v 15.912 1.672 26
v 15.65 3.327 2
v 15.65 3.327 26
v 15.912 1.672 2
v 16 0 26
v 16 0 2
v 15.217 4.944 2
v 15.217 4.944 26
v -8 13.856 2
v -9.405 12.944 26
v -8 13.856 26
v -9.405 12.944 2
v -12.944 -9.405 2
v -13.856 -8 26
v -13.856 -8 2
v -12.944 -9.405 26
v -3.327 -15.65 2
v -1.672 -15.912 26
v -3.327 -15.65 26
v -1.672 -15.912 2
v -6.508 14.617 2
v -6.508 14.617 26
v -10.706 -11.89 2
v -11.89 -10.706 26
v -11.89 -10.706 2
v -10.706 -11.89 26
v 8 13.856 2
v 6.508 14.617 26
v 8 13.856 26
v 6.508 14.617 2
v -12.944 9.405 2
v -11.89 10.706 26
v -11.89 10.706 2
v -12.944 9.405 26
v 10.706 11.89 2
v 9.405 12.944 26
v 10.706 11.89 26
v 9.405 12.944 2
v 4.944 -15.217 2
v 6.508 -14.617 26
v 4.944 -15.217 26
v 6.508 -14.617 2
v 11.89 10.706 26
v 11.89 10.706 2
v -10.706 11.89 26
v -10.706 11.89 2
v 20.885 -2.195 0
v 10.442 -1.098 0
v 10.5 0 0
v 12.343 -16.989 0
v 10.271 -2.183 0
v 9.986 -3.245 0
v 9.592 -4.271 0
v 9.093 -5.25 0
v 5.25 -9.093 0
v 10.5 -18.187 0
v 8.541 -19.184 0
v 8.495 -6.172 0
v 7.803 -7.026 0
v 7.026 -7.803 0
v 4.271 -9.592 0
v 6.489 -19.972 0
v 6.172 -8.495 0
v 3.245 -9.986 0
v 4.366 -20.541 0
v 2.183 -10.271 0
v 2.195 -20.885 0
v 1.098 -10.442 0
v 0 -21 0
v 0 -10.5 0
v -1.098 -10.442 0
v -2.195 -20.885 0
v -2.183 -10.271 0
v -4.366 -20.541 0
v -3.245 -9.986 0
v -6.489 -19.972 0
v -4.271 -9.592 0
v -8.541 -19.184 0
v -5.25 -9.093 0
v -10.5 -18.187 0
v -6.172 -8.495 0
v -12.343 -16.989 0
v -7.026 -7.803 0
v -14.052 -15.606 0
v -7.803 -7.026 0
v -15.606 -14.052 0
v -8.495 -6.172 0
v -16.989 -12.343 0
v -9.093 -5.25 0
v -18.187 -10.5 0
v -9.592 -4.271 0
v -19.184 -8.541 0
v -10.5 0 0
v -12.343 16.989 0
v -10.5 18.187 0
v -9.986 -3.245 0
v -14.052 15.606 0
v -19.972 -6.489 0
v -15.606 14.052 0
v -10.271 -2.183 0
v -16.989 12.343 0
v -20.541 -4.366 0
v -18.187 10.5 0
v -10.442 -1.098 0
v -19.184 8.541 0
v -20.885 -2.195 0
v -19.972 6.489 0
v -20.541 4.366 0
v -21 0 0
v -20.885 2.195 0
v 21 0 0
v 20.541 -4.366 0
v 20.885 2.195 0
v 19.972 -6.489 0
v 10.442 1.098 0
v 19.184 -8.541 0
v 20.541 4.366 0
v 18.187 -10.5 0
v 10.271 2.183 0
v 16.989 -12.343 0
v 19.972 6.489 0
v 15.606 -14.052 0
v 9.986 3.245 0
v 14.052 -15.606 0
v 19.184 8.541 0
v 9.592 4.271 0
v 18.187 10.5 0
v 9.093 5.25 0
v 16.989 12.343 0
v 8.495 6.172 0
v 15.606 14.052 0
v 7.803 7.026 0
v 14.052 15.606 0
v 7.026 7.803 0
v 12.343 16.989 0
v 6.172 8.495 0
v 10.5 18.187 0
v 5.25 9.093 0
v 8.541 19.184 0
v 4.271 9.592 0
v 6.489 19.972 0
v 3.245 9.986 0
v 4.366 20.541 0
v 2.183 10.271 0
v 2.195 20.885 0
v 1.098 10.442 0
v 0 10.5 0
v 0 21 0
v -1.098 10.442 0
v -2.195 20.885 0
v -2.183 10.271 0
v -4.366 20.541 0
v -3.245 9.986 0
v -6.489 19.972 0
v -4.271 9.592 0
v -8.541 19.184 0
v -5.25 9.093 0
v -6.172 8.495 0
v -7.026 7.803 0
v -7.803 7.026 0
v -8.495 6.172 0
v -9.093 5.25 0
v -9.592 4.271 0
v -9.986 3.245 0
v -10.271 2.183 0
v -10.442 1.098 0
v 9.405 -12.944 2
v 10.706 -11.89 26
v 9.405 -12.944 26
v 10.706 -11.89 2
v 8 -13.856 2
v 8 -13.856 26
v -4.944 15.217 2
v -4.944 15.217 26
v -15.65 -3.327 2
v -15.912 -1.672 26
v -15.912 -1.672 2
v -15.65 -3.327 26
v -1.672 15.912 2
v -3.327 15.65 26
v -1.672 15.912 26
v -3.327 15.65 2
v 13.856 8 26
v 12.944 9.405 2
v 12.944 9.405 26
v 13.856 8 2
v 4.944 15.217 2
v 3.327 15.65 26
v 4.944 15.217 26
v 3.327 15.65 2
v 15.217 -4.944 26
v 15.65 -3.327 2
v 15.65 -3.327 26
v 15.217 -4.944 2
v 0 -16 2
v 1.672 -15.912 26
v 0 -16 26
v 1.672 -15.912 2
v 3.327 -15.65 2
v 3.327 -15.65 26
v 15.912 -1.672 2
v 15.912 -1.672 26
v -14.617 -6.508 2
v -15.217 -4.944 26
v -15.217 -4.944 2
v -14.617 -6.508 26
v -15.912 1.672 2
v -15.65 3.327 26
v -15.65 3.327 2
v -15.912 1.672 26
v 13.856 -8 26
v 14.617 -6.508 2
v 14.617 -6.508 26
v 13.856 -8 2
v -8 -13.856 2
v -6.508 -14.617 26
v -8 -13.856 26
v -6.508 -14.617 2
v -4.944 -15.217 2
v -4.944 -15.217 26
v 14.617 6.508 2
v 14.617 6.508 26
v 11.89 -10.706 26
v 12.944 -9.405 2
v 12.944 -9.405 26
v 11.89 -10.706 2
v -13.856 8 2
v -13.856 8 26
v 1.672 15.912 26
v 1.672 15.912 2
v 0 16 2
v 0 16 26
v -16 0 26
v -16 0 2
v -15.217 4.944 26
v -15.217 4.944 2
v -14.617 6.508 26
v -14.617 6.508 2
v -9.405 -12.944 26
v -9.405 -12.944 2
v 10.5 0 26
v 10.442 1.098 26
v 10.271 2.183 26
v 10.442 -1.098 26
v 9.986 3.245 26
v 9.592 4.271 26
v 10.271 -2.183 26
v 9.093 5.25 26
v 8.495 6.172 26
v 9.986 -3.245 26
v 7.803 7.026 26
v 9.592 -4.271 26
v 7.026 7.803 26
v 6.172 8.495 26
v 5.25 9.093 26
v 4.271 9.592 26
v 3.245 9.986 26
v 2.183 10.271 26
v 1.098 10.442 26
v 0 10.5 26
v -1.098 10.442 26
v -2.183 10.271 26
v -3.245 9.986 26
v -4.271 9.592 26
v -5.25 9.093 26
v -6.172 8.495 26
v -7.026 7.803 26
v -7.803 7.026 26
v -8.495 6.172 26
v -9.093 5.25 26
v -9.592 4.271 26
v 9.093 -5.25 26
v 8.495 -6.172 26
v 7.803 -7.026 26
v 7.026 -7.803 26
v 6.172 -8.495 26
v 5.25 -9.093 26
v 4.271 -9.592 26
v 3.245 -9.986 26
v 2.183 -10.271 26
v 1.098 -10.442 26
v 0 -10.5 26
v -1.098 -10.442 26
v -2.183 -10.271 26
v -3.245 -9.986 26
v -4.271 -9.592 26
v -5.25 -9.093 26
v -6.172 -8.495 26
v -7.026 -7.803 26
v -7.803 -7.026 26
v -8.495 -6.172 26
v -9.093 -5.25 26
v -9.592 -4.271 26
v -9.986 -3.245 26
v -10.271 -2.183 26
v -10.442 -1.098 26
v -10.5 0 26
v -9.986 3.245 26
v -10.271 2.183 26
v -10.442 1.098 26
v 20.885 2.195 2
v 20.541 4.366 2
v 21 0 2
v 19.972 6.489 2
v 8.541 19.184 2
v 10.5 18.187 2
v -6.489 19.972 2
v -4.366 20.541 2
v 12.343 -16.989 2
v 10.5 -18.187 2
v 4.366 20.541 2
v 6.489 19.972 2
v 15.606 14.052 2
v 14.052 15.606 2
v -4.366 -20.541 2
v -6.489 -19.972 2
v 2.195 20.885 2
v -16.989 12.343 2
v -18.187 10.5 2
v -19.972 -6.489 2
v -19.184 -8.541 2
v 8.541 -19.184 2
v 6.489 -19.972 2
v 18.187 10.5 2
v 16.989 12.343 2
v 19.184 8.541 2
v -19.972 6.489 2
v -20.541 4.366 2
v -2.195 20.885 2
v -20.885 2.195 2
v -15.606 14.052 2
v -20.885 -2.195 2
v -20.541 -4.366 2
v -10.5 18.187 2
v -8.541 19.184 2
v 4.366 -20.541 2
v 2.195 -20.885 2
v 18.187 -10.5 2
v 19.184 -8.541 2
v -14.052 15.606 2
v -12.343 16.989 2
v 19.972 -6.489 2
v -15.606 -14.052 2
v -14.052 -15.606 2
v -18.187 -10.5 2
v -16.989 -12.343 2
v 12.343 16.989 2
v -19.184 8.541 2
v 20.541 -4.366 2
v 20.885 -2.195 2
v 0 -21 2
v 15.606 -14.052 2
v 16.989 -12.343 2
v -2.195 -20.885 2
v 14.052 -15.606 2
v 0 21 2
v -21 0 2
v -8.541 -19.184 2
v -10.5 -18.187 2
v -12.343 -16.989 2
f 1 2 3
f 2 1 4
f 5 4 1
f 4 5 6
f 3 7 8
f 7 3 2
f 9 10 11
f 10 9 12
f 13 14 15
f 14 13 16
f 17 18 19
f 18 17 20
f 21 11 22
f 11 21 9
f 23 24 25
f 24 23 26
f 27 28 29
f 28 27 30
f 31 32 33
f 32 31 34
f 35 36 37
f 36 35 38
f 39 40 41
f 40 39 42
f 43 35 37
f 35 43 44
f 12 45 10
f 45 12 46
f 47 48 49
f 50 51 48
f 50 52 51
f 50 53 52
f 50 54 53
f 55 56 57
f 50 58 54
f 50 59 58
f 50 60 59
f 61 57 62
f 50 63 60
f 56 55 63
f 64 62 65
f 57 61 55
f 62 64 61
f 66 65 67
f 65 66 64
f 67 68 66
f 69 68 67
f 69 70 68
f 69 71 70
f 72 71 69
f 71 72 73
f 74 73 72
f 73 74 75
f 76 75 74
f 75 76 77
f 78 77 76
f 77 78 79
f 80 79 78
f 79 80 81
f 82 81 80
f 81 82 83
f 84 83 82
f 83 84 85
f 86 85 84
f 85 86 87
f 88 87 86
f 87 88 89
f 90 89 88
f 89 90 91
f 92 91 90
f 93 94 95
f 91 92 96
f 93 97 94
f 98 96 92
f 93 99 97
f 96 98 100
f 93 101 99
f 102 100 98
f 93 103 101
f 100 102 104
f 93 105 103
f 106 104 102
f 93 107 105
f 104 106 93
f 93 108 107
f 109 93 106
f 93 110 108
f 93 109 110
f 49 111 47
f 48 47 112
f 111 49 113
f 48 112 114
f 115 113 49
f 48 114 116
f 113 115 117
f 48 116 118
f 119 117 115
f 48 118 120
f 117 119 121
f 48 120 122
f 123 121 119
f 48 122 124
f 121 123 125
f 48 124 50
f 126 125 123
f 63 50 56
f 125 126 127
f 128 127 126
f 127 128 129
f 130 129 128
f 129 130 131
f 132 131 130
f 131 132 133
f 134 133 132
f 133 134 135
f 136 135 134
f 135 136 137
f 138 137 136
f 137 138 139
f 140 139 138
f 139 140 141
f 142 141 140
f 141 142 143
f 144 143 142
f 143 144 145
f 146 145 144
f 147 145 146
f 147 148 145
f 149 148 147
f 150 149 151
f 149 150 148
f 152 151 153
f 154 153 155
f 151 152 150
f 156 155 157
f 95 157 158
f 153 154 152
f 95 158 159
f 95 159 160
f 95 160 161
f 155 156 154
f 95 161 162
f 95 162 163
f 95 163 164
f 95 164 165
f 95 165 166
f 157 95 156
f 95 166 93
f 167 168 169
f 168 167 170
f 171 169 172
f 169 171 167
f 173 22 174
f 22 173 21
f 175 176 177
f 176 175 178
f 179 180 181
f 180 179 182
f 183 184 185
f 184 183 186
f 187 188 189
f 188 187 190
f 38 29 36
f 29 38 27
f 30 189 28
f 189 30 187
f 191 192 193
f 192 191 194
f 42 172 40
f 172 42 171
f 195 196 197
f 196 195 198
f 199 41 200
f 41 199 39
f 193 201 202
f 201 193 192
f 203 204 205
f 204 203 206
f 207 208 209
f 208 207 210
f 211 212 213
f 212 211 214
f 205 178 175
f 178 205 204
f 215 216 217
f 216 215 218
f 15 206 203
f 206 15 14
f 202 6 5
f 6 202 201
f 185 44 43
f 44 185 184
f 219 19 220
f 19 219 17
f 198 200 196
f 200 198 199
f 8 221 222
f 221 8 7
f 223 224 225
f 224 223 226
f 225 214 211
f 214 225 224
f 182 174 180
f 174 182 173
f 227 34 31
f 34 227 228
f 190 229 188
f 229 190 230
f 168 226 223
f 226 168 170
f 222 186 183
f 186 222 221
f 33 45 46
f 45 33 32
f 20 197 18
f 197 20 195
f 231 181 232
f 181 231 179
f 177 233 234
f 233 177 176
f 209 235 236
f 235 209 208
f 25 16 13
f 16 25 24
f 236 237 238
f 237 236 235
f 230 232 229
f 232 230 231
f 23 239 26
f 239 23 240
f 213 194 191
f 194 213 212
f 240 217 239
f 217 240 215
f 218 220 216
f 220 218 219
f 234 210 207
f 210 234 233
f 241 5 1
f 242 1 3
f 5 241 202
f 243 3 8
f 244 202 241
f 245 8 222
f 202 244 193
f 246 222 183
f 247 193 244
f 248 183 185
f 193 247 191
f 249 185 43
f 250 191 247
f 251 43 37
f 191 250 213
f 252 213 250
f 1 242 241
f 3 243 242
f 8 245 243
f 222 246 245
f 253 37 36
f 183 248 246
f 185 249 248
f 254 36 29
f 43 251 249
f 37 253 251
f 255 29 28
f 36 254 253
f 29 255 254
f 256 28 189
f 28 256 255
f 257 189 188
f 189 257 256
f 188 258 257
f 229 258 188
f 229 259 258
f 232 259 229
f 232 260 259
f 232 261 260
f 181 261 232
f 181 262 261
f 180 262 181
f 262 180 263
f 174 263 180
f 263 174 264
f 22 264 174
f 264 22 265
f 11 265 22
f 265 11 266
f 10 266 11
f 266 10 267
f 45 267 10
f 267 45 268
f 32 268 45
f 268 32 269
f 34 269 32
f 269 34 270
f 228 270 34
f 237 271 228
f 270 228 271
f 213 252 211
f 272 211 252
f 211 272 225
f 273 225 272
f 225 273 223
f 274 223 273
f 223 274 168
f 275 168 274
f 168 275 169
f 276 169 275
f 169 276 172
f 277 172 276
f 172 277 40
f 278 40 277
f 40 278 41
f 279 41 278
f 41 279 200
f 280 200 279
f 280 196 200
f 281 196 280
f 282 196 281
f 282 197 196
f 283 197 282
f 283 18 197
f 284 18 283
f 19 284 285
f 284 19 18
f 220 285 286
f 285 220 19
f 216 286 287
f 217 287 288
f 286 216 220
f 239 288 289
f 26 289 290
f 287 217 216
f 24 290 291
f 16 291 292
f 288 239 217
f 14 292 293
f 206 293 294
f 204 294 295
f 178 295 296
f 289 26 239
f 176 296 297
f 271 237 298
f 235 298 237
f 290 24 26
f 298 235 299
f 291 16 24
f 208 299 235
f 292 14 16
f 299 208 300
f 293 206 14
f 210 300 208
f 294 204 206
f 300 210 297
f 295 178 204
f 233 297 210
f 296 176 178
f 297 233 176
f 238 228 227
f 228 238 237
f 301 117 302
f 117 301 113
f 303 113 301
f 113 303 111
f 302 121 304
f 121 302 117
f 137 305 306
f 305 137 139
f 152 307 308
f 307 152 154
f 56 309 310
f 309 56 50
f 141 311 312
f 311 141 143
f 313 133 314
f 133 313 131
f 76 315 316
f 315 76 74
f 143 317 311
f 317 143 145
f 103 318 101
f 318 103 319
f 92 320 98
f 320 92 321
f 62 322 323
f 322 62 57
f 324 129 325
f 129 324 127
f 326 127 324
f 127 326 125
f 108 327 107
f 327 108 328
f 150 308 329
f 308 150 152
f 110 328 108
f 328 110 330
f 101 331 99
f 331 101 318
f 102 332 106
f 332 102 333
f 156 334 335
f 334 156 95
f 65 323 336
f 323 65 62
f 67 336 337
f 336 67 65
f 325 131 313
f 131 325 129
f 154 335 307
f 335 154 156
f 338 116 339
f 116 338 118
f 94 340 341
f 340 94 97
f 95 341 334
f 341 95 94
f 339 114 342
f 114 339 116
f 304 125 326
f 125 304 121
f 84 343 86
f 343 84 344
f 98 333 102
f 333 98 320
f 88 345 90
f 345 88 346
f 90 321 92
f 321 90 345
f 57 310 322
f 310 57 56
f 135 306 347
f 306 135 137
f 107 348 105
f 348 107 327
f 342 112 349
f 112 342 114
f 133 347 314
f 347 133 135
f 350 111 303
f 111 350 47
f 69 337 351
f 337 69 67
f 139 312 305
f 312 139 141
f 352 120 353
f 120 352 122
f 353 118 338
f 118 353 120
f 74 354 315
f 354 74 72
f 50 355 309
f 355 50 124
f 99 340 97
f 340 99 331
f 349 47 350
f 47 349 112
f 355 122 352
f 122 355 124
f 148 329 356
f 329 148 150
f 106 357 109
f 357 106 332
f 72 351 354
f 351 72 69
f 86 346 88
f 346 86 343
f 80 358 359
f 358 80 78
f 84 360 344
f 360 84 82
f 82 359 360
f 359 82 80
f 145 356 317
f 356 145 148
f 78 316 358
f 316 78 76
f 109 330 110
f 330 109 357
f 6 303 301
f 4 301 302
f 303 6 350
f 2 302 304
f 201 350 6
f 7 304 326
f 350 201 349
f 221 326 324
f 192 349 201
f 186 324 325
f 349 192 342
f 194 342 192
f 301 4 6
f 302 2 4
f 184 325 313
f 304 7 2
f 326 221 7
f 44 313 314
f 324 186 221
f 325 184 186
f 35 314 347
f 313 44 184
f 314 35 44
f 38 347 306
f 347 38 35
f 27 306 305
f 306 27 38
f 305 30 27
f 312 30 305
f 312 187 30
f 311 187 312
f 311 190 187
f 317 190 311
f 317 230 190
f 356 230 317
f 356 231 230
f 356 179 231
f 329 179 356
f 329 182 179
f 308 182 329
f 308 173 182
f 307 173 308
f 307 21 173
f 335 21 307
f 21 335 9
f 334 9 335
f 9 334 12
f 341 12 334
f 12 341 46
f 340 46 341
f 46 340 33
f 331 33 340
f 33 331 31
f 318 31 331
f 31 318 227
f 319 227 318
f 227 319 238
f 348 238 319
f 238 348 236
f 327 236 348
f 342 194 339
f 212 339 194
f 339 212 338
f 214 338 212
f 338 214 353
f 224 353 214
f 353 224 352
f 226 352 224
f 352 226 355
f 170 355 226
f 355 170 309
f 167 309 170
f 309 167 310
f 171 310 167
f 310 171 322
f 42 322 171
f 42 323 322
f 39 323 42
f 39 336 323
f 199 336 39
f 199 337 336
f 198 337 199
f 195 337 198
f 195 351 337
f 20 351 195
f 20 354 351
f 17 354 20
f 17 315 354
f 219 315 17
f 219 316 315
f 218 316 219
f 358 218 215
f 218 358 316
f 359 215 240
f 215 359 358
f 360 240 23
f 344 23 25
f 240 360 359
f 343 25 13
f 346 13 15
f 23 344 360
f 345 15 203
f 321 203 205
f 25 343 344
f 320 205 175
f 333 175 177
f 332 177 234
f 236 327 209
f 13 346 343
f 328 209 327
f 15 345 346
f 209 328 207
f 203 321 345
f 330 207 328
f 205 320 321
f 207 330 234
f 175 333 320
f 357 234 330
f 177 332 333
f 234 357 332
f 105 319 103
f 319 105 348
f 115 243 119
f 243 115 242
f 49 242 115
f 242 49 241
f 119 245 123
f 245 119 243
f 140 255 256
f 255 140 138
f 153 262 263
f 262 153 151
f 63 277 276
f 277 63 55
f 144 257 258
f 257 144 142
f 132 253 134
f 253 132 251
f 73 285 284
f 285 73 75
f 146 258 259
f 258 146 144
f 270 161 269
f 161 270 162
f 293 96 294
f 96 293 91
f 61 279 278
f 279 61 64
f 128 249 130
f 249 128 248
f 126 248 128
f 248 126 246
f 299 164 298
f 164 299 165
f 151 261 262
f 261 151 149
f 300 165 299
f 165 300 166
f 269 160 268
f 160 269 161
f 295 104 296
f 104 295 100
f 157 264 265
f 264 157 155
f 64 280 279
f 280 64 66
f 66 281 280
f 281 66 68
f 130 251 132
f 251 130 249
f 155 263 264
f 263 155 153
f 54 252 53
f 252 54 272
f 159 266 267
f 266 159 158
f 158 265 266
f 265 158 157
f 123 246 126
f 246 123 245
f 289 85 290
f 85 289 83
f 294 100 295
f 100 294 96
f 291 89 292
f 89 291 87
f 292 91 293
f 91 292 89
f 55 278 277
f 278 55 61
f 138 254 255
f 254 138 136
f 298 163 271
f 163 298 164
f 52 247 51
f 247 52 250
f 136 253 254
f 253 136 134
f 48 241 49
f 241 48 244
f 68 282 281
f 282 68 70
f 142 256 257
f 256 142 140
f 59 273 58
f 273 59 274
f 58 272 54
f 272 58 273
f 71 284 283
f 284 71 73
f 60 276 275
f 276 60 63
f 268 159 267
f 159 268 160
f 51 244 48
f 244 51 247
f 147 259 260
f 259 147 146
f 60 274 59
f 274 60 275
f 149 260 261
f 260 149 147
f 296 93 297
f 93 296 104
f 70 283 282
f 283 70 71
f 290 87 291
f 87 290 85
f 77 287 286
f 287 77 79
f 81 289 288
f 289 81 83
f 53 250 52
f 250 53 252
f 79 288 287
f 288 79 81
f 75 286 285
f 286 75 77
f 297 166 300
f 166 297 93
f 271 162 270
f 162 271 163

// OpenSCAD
// Rivet nut / nutsert.
$fn = 60;
eps = 0.02;
thread_d = 21;
outer_d = 32;
length = 26;
flange_d = 42;
difference() { union() { cylinder(d=max(outer_d, thread_d+3),h=length); cylinder(d=max(flange_d, thread_d+6),h=2); } translate([0,0,-eps]) cylinder(d=thread_d,h=length+2*eps); }
